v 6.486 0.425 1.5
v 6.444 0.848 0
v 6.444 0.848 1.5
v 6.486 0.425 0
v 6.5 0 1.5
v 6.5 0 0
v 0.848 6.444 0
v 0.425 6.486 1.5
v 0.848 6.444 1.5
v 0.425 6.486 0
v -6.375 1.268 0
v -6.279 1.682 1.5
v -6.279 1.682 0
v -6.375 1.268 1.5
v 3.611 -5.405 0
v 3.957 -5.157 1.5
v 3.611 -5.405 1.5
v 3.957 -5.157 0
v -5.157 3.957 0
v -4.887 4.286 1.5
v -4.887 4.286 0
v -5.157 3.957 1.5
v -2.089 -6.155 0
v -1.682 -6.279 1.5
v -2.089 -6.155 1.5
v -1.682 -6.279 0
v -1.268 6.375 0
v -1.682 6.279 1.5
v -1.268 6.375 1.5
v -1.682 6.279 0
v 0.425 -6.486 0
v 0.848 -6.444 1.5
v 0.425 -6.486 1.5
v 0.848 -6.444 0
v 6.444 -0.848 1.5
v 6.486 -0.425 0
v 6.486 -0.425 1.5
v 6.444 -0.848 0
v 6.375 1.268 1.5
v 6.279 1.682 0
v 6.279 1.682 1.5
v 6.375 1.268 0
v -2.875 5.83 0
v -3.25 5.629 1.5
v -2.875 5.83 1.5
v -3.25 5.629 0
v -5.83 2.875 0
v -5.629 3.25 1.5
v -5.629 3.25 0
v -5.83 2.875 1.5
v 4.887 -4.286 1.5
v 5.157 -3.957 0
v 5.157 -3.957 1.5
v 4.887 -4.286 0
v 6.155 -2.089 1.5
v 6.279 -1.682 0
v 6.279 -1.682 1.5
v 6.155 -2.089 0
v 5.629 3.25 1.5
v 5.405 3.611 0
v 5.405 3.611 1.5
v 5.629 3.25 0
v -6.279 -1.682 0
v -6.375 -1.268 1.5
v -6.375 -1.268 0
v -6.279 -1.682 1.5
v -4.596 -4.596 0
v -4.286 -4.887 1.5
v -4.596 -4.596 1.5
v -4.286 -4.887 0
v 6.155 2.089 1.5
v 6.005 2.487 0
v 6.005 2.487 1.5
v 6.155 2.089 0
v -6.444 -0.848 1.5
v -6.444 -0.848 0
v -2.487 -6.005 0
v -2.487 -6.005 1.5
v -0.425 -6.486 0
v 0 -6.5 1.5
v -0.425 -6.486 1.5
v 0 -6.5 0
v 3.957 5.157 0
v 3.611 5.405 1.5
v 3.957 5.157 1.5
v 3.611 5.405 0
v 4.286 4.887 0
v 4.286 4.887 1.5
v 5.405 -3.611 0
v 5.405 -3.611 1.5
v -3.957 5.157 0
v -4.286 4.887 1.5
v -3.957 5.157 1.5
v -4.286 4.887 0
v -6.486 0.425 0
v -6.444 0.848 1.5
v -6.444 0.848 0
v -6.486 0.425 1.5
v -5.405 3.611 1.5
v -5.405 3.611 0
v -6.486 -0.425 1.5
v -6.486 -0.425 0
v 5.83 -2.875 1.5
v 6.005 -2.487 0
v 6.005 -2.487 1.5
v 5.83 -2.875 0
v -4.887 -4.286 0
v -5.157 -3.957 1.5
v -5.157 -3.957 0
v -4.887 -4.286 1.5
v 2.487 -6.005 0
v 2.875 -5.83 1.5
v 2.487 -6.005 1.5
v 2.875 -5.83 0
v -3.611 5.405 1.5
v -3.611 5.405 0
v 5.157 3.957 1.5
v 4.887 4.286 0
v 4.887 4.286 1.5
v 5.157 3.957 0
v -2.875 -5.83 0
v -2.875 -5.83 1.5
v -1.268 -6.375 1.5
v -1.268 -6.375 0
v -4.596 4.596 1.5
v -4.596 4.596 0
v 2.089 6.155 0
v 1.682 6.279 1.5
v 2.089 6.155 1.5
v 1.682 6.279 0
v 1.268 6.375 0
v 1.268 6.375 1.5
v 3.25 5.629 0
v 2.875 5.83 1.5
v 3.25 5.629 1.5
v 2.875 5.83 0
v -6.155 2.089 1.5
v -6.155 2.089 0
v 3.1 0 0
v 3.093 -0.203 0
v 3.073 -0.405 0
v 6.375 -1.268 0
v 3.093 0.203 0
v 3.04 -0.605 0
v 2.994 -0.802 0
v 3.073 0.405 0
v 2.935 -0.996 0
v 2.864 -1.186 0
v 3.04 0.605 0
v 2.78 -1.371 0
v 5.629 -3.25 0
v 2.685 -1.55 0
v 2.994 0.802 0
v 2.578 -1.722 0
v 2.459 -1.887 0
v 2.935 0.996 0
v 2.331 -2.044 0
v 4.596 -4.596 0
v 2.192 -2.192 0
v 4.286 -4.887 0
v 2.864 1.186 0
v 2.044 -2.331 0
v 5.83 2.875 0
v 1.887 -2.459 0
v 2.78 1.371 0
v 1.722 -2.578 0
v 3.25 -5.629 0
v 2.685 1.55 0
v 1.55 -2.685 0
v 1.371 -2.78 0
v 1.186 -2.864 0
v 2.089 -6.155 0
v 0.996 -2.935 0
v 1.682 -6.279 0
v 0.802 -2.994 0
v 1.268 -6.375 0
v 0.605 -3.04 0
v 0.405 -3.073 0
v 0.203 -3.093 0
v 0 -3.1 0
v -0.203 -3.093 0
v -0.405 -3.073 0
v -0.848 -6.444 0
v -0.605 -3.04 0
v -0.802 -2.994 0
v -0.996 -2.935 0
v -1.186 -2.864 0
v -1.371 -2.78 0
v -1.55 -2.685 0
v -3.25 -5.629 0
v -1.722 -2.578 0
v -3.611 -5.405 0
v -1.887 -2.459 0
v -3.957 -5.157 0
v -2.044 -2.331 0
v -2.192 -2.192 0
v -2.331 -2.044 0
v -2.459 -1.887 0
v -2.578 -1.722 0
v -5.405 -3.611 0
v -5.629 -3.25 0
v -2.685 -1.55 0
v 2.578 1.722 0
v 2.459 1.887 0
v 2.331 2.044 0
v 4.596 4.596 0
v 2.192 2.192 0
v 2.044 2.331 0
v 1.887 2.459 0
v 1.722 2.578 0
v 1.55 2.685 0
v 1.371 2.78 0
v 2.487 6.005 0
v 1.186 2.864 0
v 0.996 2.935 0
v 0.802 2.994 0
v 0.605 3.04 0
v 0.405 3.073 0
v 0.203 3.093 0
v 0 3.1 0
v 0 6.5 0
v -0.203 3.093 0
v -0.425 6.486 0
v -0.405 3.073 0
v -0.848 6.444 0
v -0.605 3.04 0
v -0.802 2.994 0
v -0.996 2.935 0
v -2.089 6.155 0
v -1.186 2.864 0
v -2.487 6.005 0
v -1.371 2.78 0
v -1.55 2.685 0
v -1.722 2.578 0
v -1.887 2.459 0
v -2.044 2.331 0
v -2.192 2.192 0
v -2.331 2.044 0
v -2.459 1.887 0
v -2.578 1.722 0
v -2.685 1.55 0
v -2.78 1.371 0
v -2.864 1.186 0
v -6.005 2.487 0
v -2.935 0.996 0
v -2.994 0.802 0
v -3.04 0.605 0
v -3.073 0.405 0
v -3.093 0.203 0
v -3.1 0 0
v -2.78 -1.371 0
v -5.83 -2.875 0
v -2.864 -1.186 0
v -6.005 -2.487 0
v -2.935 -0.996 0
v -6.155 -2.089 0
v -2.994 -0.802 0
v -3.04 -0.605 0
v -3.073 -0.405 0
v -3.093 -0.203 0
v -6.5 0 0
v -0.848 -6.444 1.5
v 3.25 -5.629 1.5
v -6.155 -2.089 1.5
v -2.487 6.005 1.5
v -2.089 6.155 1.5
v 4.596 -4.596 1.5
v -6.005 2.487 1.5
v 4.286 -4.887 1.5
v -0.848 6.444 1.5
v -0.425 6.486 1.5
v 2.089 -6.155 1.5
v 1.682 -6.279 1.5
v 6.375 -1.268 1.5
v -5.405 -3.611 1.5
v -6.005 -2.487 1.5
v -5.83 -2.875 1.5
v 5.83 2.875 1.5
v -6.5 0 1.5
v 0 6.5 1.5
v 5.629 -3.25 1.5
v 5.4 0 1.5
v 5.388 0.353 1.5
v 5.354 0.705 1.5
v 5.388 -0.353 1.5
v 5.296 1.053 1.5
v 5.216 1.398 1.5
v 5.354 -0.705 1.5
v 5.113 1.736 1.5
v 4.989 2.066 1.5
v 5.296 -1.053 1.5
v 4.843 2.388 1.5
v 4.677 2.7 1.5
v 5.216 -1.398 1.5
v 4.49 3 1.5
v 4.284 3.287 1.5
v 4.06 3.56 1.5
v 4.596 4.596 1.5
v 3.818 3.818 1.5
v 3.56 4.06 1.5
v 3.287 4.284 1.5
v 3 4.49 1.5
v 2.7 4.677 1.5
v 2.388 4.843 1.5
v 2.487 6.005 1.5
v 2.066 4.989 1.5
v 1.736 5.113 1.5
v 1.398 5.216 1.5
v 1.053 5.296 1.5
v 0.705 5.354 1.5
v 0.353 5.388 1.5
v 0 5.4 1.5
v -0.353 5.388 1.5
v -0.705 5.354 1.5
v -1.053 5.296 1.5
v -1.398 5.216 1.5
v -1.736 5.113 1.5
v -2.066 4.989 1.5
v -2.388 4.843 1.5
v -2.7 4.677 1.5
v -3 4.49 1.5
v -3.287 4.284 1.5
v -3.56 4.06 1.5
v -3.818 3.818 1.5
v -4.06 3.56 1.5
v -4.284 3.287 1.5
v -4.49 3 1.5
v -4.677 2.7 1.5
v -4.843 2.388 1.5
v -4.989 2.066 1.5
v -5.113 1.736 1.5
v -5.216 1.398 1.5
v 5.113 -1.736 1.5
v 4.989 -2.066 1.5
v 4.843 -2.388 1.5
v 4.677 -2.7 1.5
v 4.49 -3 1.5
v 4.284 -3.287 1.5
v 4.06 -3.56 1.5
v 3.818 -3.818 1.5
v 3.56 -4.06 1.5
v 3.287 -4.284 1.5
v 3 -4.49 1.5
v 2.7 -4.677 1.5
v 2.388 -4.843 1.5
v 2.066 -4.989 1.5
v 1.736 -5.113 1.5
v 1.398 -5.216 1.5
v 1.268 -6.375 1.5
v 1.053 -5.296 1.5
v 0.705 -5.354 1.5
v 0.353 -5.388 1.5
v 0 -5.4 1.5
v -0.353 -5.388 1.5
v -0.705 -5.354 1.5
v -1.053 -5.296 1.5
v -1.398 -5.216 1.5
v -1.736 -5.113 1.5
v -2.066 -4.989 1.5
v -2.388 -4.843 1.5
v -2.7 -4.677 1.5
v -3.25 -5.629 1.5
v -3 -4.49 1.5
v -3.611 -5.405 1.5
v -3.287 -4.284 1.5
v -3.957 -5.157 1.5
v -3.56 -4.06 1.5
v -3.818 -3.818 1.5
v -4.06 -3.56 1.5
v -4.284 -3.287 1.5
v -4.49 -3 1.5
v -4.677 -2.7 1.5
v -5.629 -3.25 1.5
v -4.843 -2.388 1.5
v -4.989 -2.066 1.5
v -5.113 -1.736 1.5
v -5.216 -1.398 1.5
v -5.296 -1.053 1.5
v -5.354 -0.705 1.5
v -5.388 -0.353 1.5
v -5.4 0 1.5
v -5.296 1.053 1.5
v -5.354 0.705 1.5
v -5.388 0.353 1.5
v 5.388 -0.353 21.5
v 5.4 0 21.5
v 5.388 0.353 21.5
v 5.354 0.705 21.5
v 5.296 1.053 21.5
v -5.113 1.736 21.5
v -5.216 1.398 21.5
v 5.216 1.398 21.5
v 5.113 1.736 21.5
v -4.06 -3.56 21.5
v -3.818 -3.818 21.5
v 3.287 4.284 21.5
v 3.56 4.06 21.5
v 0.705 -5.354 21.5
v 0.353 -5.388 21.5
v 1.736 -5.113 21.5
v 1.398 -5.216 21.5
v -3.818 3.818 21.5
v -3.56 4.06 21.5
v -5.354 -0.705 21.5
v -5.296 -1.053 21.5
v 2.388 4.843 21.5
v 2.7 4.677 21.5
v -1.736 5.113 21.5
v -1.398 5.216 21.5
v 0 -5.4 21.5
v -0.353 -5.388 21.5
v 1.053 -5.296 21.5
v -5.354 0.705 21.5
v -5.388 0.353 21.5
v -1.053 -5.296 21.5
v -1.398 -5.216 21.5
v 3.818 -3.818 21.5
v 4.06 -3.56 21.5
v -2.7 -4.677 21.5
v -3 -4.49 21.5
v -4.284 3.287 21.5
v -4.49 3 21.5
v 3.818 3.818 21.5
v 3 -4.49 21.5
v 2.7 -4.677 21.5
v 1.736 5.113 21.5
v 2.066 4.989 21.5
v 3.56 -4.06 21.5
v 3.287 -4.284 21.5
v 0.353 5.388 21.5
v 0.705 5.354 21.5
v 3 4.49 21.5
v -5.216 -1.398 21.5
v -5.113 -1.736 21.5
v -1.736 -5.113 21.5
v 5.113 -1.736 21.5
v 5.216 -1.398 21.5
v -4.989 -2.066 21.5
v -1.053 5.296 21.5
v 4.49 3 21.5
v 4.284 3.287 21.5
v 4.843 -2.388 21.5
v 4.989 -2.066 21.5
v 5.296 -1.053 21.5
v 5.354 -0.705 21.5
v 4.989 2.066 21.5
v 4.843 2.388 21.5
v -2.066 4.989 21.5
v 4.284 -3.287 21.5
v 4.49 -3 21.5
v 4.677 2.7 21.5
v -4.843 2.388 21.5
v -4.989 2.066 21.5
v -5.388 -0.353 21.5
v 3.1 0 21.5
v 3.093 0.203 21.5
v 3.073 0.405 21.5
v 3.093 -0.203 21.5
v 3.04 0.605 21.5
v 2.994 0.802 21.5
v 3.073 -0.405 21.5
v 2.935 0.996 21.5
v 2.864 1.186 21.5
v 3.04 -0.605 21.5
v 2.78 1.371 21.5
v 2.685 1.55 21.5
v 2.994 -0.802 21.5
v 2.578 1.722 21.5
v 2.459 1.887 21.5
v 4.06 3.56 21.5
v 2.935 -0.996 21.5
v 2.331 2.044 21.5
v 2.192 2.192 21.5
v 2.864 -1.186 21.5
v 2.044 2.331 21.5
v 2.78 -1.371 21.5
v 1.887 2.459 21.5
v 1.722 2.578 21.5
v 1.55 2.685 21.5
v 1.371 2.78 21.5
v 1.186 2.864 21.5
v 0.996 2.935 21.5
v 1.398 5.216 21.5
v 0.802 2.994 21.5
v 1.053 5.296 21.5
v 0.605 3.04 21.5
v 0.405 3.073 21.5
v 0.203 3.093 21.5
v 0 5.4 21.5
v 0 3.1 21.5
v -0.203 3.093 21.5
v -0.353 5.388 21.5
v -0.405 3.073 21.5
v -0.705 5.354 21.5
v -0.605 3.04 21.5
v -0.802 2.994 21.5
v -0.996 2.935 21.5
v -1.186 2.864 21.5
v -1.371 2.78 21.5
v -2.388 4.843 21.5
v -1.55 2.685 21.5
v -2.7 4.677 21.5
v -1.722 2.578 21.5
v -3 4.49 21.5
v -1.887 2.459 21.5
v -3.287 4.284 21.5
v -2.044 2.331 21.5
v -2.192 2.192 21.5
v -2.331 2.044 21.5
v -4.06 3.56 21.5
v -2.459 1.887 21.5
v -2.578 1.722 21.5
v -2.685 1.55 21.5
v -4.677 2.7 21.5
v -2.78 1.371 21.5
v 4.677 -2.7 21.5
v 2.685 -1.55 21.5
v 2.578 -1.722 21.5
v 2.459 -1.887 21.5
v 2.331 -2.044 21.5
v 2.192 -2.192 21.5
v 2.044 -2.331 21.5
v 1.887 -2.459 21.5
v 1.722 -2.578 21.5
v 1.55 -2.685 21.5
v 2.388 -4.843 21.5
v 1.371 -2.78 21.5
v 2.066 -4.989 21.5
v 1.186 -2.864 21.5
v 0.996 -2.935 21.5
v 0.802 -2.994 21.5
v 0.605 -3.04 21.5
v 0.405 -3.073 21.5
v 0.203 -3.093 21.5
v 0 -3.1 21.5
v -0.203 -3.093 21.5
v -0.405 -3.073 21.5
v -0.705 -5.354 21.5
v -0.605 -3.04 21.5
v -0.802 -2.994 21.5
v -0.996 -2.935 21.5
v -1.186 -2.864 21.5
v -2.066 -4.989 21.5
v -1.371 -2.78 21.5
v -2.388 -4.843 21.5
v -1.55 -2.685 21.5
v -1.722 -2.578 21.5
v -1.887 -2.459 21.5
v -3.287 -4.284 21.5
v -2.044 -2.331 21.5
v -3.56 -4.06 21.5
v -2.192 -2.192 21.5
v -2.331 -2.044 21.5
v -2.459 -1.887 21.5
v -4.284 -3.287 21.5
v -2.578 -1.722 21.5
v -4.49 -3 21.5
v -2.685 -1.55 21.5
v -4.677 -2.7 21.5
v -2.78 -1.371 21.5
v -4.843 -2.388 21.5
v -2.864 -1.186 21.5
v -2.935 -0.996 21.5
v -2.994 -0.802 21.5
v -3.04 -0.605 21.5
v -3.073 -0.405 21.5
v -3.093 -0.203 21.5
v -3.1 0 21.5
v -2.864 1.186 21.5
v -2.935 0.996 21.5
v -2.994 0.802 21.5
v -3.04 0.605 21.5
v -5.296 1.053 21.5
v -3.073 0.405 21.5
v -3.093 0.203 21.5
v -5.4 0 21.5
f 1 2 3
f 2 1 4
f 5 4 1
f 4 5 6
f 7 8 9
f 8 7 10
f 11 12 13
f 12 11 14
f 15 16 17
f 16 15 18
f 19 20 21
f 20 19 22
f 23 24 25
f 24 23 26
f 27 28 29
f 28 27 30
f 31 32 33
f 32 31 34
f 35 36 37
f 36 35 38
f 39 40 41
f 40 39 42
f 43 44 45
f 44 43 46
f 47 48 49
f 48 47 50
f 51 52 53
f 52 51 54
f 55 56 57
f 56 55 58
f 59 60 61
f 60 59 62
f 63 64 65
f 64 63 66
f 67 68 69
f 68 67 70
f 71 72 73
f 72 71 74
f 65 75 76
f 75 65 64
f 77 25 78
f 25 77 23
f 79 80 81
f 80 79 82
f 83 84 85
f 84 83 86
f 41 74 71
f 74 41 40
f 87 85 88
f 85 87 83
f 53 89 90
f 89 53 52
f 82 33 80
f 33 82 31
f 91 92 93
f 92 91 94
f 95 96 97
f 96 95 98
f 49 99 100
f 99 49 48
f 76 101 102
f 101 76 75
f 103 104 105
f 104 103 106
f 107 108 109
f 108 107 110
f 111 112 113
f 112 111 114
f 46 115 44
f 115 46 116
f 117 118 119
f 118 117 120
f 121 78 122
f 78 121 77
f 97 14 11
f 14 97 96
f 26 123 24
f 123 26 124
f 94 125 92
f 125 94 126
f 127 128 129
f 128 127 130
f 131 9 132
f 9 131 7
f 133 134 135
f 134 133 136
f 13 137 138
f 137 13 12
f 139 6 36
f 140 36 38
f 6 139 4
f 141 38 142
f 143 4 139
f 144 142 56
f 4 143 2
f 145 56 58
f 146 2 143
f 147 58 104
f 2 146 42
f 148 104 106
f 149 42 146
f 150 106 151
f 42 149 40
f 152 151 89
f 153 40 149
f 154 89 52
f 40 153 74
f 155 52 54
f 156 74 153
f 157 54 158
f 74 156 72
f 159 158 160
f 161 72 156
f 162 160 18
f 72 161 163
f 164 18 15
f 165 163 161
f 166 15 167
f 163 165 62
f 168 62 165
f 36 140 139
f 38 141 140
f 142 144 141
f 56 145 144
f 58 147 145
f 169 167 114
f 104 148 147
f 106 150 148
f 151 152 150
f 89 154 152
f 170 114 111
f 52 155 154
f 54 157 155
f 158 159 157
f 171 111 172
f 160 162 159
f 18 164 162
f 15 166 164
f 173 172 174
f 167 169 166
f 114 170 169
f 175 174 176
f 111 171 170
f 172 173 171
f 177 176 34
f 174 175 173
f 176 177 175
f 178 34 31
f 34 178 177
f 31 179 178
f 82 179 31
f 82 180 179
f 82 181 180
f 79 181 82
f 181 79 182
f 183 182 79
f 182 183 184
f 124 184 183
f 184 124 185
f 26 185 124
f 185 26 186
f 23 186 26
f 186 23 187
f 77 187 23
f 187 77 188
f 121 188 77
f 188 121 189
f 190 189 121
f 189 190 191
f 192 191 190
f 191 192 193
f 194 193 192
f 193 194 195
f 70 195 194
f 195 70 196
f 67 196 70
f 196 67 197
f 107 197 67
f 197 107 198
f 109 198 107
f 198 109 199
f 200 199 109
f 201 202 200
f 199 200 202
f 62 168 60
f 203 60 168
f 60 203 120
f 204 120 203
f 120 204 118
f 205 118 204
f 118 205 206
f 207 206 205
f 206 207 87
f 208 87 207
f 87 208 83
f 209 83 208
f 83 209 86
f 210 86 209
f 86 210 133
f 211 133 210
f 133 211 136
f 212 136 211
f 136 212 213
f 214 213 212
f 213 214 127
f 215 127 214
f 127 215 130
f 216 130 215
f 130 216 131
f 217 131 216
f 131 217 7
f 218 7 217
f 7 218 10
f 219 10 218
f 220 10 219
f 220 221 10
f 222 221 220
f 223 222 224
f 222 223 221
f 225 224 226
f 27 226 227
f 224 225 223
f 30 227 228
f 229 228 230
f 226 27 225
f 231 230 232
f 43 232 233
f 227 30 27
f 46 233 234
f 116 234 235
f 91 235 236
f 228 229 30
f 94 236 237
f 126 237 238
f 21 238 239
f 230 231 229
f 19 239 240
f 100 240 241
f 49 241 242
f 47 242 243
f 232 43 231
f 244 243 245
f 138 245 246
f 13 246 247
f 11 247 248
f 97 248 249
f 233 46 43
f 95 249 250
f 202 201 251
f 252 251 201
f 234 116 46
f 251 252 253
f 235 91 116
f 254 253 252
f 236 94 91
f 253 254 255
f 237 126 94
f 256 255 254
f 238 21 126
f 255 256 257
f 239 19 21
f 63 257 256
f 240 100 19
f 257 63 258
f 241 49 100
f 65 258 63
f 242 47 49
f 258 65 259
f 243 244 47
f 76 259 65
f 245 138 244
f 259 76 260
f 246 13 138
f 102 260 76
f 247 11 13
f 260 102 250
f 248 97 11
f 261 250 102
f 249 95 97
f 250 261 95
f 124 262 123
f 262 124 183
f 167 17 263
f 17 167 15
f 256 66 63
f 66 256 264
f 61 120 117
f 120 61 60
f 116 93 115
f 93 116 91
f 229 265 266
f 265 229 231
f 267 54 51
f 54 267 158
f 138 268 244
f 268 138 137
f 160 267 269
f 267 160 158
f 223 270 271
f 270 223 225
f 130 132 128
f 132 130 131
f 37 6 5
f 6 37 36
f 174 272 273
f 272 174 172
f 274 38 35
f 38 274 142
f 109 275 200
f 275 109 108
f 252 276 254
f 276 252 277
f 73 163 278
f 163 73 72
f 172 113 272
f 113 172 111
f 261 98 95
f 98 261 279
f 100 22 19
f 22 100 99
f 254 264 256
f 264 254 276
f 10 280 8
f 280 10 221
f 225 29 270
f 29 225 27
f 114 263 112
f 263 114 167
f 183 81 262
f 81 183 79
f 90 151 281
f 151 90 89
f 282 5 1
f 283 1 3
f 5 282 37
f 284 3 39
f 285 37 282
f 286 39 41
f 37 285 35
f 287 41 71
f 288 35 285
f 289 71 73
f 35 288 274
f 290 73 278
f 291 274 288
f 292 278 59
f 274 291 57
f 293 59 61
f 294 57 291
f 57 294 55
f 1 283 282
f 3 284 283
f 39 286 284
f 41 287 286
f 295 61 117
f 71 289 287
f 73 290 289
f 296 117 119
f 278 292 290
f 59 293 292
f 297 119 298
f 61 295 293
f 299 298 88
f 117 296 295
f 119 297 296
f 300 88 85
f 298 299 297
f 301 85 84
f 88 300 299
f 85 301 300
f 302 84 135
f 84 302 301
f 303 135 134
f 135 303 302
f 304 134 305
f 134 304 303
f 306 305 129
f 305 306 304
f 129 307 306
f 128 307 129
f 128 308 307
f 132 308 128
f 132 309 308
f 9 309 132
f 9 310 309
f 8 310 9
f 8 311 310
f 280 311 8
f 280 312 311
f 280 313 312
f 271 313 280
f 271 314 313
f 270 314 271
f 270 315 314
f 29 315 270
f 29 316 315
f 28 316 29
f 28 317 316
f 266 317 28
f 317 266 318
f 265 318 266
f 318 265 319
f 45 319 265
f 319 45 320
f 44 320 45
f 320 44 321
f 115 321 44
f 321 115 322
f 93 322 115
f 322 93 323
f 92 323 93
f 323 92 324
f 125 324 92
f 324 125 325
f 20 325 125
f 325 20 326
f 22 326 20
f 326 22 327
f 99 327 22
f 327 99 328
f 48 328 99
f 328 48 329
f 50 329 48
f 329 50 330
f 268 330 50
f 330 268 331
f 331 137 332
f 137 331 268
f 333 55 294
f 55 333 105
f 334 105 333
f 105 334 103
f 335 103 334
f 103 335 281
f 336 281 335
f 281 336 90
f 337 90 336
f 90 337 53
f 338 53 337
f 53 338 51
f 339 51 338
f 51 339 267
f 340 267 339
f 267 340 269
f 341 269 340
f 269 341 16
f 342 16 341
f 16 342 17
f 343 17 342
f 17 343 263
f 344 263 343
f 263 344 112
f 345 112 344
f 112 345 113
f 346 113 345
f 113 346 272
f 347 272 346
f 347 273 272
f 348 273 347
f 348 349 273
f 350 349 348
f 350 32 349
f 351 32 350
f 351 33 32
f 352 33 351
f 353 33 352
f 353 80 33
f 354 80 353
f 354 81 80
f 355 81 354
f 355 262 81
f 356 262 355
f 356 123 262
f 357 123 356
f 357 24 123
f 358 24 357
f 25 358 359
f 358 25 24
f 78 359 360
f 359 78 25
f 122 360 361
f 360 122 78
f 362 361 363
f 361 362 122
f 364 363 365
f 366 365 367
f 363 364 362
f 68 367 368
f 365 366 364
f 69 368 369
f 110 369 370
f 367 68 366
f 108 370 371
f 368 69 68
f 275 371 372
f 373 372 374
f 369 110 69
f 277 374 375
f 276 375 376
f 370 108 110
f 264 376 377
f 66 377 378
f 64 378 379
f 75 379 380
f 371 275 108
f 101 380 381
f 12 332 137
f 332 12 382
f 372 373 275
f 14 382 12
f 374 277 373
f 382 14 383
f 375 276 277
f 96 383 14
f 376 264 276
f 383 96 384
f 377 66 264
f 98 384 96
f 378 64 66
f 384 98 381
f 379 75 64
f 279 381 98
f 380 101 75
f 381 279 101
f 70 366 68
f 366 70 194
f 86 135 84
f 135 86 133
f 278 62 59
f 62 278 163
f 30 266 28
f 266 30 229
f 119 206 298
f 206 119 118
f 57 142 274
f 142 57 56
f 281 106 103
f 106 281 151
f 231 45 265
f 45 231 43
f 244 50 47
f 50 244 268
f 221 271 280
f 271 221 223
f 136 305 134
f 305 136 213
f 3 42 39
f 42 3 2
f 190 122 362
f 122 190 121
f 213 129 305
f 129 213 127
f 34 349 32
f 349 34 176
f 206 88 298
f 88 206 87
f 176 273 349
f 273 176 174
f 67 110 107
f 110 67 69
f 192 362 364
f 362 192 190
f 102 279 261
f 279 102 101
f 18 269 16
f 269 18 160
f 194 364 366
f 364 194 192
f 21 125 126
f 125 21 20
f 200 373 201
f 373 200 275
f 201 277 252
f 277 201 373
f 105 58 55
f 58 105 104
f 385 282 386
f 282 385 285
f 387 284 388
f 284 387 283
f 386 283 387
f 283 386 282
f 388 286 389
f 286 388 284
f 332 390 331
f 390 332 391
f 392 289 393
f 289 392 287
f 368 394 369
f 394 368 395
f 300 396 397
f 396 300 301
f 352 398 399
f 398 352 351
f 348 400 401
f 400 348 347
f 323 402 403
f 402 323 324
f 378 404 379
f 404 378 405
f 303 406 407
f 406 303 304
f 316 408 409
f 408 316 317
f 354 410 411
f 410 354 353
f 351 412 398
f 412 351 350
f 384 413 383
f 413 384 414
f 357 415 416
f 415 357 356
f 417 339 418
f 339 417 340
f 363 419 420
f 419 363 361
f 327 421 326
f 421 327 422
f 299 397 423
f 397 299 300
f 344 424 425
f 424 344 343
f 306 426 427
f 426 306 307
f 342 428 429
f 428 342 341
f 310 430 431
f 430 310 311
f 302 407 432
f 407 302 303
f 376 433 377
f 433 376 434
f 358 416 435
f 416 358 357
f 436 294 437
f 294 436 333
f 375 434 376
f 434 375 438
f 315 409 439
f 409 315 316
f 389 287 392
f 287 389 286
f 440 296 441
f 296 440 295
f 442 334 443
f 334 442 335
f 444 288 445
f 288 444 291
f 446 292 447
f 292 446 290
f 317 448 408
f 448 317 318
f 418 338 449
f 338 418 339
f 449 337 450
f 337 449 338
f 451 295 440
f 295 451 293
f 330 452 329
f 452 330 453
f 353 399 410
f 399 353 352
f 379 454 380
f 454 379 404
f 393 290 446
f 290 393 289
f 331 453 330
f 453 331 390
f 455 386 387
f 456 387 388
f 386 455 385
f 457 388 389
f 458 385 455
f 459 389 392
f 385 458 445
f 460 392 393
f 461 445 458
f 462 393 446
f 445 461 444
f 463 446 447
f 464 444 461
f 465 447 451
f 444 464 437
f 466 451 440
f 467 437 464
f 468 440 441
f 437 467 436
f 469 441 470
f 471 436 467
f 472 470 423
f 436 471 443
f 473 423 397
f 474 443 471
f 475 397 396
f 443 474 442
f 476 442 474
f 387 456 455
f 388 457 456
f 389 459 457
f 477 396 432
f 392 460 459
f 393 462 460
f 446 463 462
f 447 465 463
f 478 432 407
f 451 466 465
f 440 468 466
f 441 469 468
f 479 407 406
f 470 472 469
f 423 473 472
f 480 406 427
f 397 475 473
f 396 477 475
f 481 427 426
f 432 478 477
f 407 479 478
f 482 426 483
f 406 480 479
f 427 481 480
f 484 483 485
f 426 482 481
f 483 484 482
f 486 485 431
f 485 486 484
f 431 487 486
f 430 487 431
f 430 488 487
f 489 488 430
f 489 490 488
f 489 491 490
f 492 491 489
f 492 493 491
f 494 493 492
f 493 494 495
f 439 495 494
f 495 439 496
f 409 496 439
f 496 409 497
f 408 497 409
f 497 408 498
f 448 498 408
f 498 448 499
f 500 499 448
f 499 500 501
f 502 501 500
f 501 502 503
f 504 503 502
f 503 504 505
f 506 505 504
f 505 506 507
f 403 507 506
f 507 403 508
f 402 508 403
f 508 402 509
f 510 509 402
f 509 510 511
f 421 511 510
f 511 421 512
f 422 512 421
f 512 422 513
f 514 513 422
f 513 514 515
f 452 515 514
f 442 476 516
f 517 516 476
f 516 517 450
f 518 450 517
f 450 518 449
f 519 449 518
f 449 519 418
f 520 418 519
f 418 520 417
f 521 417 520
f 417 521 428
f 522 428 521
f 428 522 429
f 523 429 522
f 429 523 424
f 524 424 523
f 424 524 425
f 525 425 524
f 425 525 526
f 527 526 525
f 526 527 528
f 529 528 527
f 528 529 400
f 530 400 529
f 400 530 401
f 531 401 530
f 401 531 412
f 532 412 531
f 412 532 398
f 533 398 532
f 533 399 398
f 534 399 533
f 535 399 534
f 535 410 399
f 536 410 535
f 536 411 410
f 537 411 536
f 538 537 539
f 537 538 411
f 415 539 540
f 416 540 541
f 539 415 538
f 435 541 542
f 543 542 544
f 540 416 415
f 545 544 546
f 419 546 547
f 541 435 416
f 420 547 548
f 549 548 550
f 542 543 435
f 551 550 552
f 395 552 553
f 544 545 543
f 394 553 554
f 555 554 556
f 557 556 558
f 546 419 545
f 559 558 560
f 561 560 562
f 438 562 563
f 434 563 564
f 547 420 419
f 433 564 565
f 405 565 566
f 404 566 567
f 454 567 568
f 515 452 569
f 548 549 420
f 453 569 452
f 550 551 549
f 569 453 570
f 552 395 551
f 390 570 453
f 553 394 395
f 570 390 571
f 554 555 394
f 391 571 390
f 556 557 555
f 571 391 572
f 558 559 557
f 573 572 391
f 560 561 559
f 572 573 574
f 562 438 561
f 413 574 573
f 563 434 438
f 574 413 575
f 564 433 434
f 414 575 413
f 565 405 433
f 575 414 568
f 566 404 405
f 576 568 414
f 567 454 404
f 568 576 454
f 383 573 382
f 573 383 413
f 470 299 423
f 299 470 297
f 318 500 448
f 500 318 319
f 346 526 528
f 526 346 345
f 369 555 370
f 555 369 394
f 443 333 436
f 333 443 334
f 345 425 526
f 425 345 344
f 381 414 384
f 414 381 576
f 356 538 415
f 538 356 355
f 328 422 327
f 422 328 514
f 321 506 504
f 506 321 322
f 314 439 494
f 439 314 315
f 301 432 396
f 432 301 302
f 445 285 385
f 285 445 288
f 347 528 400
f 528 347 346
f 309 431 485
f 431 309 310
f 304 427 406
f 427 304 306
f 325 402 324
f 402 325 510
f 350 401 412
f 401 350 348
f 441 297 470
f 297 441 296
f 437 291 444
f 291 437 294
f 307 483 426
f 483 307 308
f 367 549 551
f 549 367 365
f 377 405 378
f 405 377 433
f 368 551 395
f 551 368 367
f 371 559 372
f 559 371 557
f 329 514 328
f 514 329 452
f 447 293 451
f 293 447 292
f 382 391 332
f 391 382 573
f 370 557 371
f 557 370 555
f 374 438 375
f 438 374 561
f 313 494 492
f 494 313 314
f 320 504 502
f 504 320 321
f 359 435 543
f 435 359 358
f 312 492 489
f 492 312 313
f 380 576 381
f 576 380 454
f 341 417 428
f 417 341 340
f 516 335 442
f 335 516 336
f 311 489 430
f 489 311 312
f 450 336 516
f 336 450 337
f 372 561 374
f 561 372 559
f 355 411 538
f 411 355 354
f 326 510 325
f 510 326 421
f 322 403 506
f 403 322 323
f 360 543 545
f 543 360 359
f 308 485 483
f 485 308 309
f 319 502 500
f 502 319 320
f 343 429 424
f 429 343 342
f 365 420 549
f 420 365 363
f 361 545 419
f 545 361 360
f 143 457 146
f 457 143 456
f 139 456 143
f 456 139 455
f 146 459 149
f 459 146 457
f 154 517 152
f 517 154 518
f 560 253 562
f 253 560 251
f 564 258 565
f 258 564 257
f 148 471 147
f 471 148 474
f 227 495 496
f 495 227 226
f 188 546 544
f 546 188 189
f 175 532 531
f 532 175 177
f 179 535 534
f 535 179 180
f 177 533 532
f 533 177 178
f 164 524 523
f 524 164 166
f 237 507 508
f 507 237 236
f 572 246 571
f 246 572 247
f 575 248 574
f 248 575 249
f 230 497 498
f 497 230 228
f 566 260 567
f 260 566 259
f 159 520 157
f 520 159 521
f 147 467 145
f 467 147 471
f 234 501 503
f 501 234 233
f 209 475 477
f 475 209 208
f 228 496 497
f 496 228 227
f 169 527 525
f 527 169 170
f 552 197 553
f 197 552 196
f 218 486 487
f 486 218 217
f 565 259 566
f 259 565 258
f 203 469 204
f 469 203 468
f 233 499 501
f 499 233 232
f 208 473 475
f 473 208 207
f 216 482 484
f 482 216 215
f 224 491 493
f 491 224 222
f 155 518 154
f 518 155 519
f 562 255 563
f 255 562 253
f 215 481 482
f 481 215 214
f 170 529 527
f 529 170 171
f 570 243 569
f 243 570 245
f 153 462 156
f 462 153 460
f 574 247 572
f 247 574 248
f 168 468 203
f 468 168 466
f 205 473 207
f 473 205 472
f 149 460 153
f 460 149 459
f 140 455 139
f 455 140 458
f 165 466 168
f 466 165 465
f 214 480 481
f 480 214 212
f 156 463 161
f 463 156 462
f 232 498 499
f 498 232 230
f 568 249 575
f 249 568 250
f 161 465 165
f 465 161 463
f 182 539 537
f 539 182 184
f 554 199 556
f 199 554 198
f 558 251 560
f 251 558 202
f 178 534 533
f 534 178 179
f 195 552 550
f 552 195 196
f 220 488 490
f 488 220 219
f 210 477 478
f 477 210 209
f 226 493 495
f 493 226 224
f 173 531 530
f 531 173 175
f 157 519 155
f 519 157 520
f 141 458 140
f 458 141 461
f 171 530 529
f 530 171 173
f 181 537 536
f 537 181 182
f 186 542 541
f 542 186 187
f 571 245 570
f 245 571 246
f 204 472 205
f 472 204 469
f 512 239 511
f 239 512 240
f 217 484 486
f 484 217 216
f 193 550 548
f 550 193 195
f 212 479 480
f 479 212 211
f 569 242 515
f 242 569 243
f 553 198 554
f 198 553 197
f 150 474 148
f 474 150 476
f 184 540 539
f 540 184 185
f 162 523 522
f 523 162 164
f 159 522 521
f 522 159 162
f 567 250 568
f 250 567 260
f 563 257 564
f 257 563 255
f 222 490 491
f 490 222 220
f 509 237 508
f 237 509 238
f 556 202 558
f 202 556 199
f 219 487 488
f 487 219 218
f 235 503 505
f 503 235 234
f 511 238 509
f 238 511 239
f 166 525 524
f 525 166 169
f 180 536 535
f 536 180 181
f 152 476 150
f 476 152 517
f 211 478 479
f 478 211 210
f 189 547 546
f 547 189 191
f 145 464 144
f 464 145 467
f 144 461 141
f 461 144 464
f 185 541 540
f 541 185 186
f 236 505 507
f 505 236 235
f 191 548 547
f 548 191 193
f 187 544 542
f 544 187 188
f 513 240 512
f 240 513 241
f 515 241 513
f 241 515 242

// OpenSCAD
// Adapter sleeve: 0.2 mL PCR tube fits into a 1.5 mL tube rack hole
// Print orientation: collar on the bed, sleeve body pointing up (+Z)

$fn = 96;

// ---- Dimensions (mm) ----
collar_d      = 13;    // collar outer diameter
collar_h      = 1.5;   // collar thickness (z = 0 to 1.5)
sleeve_od     = 10.8;  // sleeve body outer diameter
sleeve_top_z  = 21.5;  // top of sleeve body (absolute Z)
bore_d        = 6.2;   // through-bore diameter
eps           = 0.5;   // cutter overshoot past faces

total_h = sleeve_top_z; // overall height (21.5 mm)

difference() {
    union() {
        // Collar: disc from z = 0 to z = 1.5
        cylinder(d = collar_d, h = collar_h);

        // Sleeve body: tube from top of collar up to z = 21.5
        translate([0, 0, collar_h])
            cylinder(d = sleeve_od, h = total_h - collar_h);
    }

    // Straight bore through the full height, open at both ends
    translate([0, 0, -eps])
        cylinder(d = bore_d, h = total_h + 2 * eps);
}
